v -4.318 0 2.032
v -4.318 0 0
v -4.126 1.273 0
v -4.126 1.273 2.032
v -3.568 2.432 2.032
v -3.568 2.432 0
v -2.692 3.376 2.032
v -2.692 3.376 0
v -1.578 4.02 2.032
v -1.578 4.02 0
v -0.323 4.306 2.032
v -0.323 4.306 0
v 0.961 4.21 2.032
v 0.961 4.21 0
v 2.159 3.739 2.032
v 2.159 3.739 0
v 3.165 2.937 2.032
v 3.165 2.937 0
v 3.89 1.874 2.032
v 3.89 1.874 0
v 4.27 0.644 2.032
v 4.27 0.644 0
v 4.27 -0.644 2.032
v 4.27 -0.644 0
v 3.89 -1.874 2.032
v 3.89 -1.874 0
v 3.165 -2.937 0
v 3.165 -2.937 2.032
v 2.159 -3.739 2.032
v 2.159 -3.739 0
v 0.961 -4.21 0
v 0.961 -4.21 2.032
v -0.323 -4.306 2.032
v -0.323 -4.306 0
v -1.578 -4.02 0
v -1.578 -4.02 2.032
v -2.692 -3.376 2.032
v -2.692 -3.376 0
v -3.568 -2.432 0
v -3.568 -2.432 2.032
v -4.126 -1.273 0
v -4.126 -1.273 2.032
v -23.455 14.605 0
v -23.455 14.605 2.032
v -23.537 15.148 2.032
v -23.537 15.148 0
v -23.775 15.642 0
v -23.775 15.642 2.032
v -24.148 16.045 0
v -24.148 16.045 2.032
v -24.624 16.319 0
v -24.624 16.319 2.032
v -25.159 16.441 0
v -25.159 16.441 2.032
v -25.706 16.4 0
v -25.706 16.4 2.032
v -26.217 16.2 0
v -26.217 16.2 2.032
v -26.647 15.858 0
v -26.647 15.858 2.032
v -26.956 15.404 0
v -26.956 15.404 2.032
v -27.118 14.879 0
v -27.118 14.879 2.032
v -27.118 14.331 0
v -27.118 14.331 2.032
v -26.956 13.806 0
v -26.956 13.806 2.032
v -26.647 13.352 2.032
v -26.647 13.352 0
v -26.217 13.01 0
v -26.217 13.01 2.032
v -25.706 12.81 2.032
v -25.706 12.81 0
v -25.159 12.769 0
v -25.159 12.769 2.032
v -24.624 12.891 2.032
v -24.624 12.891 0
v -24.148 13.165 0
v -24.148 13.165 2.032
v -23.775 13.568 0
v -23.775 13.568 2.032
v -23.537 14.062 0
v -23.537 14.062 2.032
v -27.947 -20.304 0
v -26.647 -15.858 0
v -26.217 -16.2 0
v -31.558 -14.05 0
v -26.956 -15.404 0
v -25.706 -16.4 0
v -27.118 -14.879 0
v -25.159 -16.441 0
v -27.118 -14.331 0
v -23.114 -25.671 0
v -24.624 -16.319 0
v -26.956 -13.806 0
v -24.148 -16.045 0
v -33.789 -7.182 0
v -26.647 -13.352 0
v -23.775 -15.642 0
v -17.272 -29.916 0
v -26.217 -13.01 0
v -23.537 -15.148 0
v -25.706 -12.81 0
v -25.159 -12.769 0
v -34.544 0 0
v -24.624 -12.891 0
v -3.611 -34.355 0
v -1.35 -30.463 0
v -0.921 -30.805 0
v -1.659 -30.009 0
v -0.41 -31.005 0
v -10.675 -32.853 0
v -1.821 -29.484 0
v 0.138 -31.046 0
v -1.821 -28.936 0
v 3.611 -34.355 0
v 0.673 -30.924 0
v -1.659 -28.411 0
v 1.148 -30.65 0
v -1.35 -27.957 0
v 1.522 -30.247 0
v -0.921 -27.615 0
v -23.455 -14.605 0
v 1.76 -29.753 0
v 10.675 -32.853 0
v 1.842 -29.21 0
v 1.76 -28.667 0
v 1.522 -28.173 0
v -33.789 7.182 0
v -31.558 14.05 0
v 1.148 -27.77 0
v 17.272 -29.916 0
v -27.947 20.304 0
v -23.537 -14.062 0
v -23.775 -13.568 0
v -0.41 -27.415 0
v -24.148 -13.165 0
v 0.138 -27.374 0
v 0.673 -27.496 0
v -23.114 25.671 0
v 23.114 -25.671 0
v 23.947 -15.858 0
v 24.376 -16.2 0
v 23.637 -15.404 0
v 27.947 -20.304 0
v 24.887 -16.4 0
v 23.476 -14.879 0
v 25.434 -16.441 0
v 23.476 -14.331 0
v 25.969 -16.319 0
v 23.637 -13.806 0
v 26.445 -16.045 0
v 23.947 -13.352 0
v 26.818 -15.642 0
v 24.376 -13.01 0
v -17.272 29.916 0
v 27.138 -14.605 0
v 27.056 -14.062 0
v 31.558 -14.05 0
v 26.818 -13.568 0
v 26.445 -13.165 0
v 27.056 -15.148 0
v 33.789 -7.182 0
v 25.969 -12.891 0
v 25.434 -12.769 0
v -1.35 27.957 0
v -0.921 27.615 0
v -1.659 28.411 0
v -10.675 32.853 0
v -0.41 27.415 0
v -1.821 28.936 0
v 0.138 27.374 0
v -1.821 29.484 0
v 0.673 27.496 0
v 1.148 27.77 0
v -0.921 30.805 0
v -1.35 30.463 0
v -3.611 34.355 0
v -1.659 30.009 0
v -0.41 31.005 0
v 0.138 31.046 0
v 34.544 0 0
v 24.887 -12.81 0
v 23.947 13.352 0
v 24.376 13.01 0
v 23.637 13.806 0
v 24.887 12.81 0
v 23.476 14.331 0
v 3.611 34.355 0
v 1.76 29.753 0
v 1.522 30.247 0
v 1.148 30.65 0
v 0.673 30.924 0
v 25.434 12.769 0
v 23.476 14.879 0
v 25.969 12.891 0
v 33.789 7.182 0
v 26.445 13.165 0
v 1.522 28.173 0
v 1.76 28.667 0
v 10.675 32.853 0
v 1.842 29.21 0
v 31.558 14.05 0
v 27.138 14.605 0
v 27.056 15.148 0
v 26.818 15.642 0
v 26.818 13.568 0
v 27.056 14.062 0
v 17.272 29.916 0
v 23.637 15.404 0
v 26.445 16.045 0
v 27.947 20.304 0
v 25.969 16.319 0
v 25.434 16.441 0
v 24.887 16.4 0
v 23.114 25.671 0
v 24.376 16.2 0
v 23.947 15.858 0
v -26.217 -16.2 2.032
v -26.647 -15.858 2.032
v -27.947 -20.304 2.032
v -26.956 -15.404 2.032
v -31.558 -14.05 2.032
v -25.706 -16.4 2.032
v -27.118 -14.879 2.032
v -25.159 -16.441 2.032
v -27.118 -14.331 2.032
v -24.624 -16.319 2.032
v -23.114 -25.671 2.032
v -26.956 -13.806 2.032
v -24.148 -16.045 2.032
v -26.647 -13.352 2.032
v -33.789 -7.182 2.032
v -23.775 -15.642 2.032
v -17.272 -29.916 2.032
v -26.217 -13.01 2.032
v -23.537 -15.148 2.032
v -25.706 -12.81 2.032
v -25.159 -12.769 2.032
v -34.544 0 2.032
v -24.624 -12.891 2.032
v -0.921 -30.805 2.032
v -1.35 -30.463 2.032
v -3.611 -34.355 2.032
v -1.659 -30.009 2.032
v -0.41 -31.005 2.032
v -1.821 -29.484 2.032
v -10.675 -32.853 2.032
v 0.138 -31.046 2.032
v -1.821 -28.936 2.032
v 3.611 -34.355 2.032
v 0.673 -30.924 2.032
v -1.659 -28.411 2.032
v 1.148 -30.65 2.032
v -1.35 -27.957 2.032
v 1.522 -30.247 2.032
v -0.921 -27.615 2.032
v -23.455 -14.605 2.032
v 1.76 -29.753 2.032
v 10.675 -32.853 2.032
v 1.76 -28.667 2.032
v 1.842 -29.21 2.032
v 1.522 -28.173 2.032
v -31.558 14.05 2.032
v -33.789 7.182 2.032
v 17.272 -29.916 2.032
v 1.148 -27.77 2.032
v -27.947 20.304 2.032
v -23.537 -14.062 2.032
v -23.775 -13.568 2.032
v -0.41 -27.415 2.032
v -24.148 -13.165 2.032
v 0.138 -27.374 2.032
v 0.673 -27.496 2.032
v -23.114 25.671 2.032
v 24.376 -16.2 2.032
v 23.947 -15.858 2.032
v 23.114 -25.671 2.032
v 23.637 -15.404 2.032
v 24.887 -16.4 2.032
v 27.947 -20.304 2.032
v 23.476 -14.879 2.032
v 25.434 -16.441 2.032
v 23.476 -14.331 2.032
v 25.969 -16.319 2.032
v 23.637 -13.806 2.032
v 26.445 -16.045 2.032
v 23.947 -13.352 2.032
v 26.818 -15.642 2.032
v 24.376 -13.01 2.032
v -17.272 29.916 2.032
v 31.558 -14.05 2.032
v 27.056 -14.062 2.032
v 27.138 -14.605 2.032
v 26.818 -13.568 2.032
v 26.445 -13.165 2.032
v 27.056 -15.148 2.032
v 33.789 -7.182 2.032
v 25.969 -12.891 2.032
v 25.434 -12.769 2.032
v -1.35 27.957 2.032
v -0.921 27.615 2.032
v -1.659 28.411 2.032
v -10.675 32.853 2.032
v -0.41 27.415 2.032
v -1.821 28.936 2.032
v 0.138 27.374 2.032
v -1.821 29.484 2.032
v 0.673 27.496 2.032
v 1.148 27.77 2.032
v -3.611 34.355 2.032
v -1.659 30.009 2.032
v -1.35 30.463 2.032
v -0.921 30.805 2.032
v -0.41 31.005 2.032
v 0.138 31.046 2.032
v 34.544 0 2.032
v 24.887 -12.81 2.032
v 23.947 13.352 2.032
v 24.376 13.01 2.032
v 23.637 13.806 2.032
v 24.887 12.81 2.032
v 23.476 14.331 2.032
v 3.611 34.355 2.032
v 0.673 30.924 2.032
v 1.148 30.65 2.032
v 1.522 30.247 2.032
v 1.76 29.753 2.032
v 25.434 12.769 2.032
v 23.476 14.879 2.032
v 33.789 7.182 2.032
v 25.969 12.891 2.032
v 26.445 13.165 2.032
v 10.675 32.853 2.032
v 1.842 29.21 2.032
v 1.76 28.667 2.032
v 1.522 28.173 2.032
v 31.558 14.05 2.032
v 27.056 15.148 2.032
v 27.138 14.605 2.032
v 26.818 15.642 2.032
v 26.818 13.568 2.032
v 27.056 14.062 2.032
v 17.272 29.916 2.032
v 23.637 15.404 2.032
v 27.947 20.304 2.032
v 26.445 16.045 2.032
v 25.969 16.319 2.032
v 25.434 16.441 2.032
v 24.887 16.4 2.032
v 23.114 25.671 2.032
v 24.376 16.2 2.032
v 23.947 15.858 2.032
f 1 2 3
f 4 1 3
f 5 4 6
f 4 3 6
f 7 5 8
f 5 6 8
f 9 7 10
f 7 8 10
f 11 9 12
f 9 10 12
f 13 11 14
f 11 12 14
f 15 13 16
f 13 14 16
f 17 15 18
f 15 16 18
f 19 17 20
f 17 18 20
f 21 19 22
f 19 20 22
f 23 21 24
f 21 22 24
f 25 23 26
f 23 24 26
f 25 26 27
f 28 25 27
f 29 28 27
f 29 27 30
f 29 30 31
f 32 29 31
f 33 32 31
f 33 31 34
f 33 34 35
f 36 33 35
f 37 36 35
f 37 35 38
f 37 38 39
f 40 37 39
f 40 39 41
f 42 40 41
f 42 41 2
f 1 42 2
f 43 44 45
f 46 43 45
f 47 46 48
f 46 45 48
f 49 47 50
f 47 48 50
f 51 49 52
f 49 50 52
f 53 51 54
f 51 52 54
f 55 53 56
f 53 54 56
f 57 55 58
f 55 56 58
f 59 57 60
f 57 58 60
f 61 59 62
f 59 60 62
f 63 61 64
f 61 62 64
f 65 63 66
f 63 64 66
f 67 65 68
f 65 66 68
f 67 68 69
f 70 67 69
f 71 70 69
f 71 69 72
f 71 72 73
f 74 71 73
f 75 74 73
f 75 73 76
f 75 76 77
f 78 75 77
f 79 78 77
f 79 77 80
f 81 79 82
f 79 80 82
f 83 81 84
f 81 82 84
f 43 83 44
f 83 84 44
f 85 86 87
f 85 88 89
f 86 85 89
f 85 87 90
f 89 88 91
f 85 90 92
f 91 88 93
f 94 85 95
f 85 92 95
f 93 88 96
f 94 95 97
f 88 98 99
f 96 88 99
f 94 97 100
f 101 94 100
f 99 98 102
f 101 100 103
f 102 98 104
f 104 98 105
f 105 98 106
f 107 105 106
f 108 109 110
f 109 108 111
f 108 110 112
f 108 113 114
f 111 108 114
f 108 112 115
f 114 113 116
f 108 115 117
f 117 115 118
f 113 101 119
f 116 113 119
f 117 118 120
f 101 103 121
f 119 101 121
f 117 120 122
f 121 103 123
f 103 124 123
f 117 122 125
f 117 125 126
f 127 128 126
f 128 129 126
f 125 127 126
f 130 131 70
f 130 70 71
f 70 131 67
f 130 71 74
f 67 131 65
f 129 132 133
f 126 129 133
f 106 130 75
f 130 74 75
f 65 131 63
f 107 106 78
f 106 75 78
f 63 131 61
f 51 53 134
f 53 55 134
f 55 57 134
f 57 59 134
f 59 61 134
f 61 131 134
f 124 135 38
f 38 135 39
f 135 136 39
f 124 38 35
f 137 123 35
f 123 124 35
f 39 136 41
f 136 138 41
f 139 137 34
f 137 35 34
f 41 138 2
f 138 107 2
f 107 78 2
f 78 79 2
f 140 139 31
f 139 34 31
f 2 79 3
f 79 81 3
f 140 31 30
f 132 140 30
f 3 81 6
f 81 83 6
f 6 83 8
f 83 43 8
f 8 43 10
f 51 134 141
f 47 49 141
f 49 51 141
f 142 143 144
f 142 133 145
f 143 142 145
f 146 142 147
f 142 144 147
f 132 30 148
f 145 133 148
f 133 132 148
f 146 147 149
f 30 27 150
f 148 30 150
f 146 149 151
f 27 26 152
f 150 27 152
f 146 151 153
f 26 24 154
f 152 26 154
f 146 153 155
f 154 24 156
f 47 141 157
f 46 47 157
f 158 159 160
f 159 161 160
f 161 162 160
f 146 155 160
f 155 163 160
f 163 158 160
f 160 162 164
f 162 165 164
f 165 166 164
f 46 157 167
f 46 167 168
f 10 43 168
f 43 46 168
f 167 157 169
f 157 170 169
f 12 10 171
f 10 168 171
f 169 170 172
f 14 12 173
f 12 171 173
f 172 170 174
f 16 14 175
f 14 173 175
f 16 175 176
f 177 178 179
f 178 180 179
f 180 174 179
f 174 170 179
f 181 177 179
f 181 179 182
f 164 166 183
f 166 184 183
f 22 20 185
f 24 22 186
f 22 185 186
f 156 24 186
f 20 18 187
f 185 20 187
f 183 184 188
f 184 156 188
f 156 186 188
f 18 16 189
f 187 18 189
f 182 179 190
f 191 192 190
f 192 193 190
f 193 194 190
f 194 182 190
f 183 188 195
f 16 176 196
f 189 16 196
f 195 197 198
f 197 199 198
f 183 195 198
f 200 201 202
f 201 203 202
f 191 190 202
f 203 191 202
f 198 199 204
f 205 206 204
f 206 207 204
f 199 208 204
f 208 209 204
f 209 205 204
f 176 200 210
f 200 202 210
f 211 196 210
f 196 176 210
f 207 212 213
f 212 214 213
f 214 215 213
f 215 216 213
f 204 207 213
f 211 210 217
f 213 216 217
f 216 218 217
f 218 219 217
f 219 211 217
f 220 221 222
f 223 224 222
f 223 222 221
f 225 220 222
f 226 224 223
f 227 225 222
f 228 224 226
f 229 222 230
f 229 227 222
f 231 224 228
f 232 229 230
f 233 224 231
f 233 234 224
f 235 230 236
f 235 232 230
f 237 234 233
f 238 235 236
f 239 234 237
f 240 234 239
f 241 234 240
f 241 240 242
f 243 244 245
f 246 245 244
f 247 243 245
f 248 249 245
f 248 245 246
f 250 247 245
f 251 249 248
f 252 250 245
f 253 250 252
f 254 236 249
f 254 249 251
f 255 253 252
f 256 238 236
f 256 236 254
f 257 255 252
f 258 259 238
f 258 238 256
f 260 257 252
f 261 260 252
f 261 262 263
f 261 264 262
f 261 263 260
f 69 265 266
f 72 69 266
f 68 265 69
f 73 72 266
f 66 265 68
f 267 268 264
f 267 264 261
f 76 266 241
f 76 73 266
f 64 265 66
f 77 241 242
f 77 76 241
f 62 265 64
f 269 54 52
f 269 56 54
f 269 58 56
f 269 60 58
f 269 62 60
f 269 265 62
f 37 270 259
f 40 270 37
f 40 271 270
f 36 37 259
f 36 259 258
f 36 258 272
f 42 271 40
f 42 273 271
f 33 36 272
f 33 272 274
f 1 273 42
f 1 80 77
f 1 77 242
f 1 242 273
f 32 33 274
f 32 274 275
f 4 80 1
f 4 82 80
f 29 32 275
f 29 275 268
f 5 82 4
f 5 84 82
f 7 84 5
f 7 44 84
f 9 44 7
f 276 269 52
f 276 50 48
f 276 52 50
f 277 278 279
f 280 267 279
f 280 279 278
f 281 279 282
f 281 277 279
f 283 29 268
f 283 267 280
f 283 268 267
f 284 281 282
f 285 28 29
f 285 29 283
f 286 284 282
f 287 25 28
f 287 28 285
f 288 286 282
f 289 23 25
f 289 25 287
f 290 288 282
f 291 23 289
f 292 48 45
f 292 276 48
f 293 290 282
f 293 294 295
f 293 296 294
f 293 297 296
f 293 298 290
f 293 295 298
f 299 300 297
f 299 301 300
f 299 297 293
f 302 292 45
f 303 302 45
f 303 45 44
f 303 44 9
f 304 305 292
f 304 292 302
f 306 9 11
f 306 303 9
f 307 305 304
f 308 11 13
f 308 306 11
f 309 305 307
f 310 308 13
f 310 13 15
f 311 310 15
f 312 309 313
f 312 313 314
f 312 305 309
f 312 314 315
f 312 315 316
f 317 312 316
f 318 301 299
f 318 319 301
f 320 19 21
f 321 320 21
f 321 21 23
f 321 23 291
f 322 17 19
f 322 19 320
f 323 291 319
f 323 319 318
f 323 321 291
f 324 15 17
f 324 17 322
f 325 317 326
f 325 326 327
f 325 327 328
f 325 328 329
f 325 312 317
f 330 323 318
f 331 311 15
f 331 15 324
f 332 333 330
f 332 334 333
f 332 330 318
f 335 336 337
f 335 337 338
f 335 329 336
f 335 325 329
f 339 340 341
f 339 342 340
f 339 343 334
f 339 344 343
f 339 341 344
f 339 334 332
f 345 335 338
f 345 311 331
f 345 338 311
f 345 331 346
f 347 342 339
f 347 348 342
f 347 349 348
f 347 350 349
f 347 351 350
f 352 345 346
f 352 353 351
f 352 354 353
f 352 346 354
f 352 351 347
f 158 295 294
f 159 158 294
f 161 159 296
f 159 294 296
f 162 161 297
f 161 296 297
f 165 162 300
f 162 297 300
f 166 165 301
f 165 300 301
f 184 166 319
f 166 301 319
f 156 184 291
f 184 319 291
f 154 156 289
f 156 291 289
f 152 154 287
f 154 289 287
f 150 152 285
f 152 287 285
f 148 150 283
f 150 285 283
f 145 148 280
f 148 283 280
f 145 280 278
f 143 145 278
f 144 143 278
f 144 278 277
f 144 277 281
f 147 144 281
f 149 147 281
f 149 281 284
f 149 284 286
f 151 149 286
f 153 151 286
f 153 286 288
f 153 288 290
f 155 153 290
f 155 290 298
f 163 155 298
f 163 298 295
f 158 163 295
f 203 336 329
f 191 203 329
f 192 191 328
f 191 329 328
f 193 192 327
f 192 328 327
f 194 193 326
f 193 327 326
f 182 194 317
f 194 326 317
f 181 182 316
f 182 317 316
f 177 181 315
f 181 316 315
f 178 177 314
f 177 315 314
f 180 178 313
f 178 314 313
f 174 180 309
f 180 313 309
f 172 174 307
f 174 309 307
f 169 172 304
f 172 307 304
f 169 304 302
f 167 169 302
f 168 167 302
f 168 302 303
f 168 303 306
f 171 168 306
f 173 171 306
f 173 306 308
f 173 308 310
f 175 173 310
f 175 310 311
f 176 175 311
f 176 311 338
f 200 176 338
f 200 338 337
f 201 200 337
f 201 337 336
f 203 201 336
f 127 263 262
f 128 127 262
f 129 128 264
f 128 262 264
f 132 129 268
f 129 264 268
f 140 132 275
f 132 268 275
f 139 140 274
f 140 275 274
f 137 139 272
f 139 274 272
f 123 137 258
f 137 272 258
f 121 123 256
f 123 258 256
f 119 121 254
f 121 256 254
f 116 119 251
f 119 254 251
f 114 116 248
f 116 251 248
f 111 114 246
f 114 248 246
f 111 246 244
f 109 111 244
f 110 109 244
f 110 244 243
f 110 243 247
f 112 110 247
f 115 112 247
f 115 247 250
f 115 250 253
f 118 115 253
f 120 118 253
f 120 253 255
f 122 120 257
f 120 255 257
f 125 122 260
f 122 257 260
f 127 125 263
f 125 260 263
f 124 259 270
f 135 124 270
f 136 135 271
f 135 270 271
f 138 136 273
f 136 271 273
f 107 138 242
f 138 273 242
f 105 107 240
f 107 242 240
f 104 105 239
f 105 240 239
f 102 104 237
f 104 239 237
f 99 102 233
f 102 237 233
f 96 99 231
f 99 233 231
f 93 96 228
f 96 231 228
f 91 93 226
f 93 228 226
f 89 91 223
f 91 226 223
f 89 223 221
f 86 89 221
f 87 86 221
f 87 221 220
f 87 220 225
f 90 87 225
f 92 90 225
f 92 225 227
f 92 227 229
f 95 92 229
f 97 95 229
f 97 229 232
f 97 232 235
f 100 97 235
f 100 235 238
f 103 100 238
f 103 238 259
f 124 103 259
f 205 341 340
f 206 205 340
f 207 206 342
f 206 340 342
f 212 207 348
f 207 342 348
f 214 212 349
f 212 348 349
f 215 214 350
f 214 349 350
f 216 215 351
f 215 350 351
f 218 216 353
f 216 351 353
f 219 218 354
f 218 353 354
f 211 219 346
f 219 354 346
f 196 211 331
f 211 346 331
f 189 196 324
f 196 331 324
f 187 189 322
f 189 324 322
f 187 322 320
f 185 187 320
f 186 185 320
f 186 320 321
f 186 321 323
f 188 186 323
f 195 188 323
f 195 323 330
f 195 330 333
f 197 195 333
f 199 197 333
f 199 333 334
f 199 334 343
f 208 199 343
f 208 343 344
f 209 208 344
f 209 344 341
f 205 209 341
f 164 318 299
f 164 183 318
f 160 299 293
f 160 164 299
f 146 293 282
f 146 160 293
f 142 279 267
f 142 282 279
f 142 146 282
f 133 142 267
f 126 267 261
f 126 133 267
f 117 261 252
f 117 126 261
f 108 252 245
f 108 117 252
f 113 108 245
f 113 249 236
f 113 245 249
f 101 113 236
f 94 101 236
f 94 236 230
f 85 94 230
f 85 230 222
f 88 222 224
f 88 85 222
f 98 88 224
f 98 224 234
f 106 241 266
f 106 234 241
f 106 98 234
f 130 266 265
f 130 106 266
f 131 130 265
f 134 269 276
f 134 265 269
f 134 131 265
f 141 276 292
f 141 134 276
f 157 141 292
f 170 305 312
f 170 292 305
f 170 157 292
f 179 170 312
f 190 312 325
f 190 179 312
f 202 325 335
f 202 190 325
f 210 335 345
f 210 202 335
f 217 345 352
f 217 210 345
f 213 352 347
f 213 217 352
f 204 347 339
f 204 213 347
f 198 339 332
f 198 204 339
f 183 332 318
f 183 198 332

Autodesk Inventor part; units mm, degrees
ref_plane "YZ Plane" through (0, 0, 0) normal (1, 0, 0) x (0, 1, 0)
ref_plane "XZ Plane" through (0, 0, 0) normal (0, 1, 0) x (-1, 0, 0)
ref_plane "XY Plane" through (0, 0, 0) normal (0, 0, 1) x (1, 0, 0)
sketch "Sketch1" plane through (0, 0, 0) normal (0, 0, 1) x (1, 0, 0)
  circle A0 centre (0, 0) radius 34.544
  dimension "d0" = 69.088
extrude "Extrusion1" add sketch "Sketch1" along normal blind 2.032
sketch "Sketch2" plane through (0, 0, 2.032) normal (0, 0, 1) x (1, 0, 0)
  line L0 (0, 0) -> (0, 29.21)
  circle A0 centre (0, 29.21) radius 1.8415
  circle A1 centre (-25.2966, 14.605) radius 1.8415
  circle A2 centre (-25.2966, -14.605) radius 1.8415
  circle A3 centre (0, -29.21) radius 1.8415
  circle A4 centre (25.2966, -14.605) radius 1.8415
  circle A5 centre (25.2966, 14.605) radius 1.8415
  dimension "d3" = 29.21
  dimension "d4" = 3.683
  dimension "d7" = 360
extrude "Extrusion2" cut sketch "Sketch2" against normal blind 2.4765
sketch "Sketch4" plane through (0, 0, 0) normal (0, 0, -1) x (-1, 0, 0)
  circle A0 centre (0, 0) radius 4.318
  dimension "d15" = 8.636
extrude "Extrusion4" cut sketch "Sketch4" against normal blind 2.4765
properties part number "pistonSealingWallFront" material "ABS Plastic"
